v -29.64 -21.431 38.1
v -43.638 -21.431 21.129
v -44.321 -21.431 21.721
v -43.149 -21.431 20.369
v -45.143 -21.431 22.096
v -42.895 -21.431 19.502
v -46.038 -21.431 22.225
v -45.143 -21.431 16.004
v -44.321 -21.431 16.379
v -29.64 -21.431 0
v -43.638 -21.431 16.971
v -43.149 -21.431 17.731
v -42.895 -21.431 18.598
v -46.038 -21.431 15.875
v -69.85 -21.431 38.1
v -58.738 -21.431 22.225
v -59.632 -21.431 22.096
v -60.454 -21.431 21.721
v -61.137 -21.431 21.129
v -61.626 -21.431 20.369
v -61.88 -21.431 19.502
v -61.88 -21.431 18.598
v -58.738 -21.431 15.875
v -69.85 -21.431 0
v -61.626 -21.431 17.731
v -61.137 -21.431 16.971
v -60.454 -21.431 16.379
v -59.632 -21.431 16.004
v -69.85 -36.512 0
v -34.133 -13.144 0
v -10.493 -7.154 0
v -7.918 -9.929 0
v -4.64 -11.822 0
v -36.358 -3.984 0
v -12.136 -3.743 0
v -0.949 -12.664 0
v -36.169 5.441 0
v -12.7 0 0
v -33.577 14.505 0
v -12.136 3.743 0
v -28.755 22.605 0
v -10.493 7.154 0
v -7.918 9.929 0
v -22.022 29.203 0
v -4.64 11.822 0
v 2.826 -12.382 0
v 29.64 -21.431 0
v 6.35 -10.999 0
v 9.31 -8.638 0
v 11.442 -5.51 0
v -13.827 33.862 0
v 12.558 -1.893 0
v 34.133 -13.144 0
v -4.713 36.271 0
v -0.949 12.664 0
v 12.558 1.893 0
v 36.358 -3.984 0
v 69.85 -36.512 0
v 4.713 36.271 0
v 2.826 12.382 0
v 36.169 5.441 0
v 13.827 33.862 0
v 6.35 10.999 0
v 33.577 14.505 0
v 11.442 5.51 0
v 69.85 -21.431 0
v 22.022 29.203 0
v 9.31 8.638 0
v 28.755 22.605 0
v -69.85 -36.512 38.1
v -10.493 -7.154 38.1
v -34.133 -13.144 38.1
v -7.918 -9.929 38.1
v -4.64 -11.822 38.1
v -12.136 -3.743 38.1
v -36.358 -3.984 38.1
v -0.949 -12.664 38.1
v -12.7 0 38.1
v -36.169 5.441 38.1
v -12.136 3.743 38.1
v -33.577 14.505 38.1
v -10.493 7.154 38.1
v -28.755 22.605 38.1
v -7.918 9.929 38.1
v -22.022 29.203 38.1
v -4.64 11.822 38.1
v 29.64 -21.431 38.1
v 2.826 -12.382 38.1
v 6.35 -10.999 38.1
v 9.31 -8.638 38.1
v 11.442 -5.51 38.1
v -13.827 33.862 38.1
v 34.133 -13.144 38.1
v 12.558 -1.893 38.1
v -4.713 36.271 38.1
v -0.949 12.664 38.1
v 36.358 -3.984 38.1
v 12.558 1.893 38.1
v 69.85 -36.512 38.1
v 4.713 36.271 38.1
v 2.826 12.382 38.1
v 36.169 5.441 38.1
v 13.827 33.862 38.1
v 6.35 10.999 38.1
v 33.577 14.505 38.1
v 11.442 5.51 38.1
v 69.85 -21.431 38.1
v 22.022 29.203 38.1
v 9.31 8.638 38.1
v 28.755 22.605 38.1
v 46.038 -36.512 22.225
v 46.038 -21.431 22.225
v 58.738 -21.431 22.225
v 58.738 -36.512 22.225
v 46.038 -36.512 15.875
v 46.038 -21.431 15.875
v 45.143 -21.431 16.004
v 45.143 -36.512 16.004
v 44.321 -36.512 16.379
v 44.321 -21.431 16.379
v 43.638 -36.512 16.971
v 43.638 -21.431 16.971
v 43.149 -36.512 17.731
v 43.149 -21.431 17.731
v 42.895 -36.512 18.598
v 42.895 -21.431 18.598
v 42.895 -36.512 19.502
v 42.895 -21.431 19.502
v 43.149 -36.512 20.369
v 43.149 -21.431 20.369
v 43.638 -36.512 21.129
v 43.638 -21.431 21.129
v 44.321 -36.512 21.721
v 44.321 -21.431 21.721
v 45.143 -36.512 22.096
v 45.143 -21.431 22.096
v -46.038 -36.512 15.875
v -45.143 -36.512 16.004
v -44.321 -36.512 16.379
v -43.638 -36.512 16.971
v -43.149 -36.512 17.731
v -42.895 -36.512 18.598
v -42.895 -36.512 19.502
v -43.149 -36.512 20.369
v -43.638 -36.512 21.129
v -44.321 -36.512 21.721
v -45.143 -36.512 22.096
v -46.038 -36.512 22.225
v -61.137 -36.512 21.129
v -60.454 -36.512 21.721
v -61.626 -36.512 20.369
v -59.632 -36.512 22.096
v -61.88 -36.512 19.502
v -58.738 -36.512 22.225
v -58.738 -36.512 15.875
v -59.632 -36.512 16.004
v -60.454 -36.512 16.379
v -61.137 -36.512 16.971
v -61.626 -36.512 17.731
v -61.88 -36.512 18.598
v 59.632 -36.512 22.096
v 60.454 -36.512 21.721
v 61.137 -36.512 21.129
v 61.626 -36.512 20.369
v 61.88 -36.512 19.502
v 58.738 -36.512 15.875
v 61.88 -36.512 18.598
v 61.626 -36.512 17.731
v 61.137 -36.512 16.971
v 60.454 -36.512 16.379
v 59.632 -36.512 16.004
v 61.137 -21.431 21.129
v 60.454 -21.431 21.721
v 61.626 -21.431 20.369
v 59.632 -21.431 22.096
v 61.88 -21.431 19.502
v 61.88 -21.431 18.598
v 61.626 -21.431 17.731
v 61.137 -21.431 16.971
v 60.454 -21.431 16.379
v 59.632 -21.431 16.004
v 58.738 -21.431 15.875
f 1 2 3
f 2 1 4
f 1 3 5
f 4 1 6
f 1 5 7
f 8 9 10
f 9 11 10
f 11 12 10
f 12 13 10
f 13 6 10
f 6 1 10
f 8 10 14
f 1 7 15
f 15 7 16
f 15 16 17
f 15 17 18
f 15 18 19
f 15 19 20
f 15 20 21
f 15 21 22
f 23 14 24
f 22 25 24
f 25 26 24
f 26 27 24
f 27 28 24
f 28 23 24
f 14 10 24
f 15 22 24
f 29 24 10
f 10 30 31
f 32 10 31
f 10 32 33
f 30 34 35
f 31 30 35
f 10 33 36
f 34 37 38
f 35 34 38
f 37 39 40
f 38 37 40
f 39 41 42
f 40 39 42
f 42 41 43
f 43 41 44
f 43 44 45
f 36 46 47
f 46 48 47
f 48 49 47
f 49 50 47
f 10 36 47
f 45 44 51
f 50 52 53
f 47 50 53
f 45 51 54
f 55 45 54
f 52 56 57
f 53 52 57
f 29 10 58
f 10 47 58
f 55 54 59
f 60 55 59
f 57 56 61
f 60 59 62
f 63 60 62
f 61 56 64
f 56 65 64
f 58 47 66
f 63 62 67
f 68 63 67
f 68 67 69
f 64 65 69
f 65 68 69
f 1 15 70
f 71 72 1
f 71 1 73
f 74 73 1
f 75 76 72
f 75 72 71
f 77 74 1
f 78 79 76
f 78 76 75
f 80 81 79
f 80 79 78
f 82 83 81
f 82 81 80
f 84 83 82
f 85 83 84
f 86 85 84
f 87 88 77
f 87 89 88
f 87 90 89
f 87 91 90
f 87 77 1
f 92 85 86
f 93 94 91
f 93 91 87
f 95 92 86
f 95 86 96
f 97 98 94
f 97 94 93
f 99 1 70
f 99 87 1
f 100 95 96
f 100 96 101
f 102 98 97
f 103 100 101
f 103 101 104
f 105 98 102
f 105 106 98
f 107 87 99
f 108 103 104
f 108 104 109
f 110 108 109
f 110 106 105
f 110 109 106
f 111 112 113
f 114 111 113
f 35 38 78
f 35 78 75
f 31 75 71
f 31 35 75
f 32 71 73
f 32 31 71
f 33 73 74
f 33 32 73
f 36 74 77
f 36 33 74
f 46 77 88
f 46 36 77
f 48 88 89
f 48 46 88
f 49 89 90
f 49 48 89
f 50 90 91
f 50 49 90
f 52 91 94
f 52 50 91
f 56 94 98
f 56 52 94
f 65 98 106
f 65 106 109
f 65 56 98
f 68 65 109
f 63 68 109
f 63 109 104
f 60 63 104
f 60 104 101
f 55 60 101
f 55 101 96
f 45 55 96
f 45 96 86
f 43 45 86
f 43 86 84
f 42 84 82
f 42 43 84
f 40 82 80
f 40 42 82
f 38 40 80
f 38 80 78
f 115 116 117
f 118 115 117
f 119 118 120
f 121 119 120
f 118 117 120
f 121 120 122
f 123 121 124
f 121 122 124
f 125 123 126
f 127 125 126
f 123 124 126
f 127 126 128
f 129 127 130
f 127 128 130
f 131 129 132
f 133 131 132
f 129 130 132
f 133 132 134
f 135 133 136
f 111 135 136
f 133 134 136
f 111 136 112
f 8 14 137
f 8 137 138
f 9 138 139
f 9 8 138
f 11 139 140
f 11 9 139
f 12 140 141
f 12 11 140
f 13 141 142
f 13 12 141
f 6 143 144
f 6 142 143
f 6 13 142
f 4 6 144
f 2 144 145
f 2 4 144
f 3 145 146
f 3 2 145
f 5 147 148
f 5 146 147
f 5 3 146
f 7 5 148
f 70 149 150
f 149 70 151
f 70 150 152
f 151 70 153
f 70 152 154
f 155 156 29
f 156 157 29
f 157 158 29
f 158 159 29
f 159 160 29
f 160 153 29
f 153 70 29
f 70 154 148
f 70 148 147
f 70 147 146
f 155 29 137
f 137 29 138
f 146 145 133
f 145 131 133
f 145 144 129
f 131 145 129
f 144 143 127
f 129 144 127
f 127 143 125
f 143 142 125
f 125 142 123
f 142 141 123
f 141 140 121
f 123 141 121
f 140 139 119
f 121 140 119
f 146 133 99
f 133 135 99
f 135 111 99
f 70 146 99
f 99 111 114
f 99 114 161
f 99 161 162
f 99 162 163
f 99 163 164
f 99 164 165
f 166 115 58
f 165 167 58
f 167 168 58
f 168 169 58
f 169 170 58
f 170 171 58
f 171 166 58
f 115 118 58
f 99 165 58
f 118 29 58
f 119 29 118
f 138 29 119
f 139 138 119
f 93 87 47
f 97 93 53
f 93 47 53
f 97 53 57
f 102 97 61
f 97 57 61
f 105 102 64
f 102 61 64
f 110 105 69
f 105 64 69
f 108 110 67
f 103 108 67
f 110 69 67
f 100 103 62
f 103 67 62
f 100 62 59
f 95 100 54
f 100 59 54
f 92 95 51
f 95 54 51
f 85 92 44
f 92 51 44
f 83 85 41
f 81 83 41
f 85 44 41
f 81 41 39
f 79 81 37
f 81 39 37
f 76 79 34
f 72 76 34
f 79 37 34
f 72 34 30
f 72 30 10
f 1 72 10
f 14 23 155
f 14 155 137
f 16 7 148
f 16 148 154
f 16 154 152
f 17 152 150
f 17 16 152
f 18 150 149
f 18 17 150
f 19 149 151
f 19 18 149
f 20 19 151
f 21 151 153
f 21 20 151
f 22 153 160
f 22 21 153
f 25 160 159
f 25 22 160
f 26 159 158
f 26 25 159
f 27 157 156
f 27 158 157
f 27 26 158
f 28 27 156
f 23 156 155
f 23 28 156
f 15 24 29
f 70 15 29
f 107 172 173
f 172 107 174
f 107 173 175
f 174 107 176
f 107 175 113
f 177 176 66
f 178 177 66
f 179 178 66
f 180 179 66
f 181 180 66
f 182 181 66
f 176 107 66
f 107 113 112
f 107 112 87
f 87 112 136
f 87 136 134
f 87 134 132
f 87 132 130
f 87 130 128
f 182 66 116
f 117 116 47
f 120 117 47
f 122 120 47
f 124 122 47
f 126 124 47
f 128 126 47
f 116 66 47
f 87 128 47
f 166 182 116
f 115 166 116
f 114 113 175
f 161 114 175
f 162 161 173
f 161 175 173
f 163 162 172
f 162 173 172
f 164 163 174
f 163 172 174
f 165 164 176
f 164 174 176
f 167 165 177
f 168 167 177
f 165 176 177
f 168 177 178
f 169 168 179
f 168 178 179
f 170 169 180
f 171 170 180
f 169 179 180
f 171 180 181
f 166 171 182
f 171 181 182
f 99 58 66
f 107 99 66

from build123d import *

# Parameters (mm, degrees)
SKETCH2_R           = 12.7
BOSS_EXTRUDE1_DEPTH = 38.1
CUT_EXTRUDE1_DEPTH  = 99.465595781


with BuildPart() as part:
    # Sketch2 → Boss-Extrude1 (new body)
    with BuildSketch(Plane.XY):
        with BuildLine():
            Line((-69.85, -36.5125), (69.85, -36.5125))
            Line((69.85, -36.5125), (69.85, -21.43125))
            Line((69.85, -21.43125), (29.639590069, -21.43125))
            ThreePointArc((29.639590069, -21.43125), (0, 36.576), (-29.639590069, -21.43125))
            Line((-29.639590069, -21.43125), (-69.85, -21.43125))
            Line((-69.85, -21.43125), (-69.85, -36.5125))
        make_face()
        with Locations(Location((0, 0, 0), (0, 0, 180))):
            Circle(SKETCH2_R, mode=Mode.SUBTRACT)
    extrude(amount=BOSS_EXTRUDE1_DEPTH)

    # Sketch3 → Cut-Extrude1 (cut, through all)
    with BuildSketch(Plane(origin=(0, -21.43125, 0), x_dir=(1, 0, 0), z_dir=(0, 1, 0))):
        with BuildLine():
            Line((-58.7375, -15.875), (-46.0375, -15.875))
            ThreePointArc((-46.0375, -15.875), (-42.8625, -19.05), (-46.0375, -22.225))
            Line((-46.0375, -22.225), (-58.7375, -22.225))
            ThreePointArc((-58.7375, -22.225), (-61.9125, -19.05), (-58.7375, -15.875))
        make_face()
    cut_extrude1 = extrude(amount=-CUT_EXTRUDE1_DEPTH, mode=Mode.SUBTRACT)

    # Mirror1: Cut-Extrude1 across plane
    add(cut_extrude1.mirror(Plane(origin=(0, 0, 0), x_dir=(0, 0, 1), z_dir=(1, 0, 0))), mode=Mode.SUBTRACT)


solid = part.part
